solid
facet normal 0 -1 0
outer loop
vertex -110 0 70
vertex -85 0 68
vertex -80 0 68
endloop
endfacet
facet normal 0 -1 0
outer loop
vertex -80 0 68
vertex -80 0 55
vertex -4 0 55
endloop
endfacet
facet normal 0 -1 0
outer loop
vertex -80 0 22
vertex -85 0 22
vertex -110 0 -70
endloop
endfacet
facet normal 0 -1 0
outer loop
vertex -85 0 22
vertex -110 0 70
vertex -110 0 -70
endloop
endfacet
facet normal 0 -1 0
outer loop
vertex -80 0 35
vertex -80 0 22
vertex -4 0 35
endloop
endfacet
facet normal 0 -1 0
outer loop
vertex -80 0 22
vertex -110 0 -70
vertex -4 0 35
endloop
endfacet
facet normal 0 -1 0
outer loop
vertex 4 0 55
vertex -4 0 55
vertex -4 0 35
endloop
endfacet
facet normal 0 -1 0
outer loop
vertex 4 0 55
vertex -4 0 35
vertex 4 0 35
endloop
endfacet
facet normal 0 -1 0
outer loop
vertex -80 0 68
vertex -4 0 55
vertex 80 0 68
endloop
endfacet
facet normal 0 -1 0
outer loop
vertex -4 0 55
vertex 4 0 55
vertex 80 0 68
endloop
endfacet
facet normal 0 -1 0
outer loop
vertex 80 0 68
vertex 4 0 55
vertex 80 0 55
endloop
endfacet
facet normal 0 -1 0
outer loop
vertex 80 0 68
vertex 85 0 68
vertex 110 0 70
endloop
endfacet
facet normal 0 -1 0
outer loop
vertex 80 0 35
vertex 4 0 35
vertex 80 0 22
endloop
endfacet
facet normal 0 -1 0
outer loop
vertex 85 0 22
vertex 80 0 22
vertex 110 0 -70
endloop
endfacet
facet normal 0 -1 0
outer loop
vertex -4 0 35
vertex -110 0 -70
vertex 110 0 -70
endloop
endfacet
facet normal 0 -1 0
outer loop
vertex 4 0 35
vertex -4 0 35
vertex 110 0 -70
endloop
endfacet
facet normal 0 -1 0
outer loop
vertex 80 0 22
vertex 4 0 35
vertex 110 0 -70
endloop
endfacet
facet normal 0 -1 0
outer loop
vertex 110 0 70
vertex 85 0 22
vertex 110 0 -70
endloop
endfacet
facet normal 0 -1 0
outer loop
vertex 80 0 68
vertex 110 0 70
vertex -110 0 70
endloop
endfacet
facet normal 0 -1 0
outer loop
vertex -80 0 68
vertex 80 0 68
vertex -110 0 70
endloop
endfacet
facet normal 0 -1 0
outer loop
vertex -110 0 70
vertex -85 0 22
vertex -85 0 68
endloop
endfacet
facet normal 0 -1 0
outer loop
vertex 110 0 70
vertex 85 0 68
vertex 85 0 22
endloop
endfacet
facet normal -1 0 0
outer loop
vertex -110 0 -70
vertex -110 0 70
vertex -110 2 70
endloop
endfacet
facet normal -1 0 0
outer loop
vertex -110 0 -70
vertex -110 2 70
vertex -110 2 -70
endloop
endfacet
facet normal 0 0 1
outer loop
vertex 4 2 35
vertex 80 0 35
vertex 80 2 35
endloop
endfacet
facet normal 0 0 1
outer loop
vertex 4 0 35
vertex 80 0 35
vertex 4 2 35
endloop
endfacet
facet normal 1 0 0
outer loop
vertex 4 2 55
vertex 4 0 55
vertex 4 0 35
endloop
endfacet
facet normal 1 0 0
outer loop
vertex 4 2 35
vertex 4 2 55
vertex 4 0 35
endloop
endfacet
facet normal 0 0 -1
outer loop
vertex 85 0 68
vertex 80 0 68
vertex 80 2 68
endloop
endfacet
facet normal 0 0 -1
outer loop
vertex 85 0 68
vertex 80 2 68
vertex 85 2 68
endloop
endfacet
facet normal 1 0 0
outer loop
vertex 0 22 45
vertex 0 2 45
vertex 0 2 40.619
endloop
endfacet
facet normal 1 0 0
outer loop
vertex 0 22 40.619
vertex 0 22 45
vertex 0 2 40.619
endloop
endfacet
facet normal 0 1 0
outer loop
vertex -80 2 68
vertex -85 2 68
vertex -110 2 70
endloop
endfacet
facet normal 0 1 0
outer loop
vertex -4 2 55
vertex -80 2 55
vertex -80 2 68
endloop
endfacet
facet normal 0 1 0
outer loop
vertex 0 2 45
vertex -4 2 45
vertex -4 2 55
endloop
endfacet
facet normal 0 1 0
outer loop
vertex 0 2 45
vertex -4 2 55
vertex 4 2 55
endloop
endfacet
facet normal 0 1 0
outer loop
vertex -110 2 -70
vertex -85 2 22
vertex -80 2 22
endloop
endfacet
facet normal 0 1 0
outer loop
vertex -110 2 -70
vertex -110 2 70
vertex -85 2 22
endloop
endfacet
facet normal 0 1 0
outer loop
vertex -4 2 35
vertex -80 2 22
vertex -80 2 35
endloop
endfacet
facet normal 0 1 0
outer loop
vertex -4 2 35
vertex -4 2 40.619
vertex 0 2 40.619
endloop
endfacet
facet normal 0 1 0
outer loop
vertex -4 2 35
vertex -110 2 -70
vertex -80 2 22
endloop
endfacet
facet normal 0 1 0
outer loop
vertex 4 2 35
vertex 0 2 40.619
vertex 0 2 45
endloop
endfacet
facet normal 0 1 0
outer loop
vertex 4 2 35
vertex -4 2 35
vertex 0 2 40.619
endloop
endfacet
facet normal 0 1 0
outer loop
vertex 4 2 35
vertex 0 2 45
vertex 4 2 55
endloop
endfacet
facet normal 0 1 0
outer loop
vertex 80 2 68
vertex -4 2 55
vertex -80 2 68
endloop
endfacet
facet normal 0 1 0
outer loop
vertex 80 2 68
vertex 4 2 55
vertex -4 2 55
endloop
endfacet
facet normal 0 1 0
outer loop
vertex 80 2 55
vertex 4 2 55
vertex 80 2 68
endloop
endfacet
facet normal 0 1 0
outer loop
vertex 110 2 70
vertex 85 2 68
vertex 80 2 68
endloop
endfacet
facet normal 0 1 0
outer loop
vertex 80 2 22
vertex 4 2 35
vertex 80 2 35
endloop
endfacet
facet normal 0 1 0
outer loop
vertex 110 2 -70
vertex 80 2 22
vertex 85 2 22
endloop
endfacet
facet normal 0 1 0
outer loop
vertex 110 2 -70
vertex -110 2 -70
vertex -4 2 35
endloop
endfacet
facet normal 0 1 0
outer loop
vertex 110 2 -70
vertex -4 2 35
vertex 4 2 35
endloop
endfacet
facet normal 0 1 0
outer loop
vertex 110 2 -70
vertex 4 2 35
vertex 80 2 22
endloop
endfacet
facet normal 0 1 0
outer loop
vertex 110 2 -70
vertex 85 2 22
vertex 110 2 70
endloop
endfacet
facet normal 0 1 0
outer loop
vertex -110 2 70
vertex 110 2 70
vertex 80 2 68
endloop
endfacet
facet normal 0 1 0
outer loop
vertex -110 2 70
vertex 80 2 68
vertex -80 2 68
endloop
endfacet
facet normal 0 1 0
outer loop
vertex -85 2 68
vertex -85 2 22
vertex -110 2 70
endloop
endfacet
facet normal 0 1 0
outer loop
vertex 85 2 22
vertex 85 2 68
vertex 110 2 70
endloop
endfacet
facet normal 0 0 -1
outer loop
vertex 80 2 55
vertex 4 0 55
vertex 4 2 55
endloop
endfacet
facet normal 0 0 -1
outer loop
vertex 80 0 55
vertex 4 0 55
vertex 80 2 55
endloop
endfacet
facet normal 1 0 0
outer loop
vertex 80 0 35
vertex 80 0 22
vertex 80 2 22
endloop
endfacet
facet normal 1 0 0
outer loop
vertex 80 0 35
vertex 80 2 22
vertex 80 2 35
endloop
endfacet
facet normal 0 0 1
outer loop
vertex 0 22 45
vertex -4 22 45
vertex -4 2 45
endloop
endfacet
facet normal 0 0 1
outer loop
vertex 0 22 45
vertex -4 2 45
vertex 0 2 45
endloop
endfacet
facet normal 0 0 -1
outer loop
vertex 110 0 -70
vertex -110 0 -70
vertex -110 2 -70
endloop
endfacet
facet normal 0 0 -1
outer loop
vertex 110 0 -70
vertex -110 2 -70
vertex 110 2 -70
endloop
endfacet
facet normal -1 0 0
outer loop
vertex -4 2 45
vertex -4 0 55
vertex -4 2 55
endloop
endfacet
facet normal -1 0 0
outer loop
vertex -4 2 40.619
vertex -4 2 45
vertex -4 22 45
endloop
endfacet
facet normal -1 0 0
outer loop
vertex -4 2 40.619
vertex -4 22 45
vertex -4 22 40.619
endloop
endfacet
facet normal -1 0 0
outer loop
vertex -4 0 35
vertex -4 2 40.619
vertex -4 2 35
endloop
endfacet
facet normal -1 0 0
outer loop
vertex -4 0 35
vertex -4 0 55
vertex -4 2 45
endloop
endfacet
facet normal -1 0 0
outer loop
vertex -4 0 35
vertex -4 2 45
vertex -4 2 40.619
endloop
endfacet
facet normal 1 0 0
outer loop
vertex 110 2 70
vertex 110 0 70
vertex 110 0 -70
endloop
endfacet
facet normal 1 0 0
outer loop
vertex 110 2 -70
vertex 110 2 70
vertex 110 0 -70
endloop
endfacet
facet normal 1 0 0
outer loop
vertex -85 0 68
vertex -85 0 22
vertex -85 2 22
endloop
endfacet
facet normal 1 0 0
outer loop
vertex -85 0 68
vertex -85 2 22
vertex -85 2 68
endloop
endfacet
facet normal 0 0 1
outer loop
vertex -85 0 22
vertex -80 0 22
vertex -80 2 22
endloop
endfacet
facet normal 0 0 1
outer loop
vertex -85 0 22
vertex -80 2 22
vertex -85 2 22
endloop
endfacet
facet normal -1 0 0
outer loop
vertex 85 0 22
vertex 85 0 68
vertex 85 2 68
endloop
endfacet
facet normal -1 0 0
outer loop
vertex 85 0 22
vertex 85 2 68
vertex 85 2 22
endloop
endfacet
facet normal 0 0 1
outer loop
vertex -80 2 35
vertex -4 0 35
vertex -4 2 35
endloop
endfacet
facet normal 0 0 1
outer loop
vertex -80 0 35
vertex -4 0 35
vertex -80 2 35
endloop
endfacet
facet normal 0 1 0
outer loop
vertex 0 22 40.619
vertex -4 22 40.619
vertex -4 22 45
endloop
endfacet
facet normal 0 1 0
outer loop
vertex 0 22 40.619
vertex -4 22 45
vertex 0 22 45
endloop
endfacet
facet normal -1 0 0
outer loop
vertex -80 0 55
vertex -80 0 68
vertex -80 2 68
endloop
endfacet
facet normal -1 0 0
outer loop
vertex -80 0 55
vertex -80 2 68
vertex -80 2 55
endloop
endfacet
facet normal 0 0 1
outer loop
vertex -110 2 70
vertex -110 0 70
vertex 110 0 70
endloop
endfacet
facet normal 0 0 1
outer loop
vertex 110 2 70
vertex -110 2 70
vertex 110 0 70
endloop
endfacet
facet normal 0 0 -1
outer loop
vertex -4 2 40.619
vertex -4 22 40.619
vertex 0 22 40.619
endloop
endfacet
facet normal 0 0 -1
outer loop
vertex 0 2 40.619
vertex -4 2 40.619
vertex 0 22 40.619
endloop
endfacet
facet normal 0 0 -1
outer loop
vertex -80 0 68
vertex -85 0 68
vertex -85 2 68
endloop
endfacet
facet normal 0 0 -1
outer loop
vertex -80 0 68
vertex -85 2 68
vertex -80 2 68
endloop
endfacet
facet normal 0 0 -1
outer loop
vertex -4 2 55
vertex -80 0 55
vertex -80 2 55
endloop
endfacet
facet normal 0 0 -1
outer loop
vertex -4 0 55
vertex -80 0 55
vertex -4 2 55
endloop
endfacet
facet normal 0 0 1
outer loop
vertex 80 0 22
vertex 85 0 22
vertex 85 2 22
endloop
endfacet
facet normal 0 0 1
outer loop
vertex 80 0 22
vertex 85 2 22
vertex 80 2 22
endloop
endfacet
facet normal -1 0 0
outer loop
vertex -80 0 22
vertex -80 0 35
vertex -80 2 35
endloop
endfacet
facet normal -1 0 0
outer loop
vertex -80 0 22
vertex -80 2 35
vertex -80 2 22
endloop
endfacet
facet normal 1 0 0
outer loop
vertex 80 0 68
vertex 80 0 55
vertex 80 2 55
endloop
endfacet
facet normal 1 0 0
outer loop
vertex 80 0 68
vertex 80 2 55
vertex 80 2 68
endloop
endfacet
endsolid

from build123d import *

# Parameters (mm, degrees)
SKETCH2_W           = 220
SKETCH2_H           = 140
BOSS_EXTRUDE1_DEPTH = 2
CUT_EXTRUDE1_DEPTH  = 2
SKETCH4_W           = 8
SKETCH4_H           = 20
BOSS_EXTRUDE2_DEPTH = 2
SKETCH5_W           = 4
SKETCH5_H           = 4.381248614
BOSS_EXTRUDE3_DEPTH = 20


with BuildPart() as part:
    # Sketch2 → Boss-Extrude1 (new body)
    with BuildSketch(Plane(origin=(0, 0, 0), x_dir=(1, 0, 0), z_dir=(0, 1, 0))):
        Rectangle(SKETCH2_W, SKETCH2_H)
    extrude(amount=BOSS_EXTRUDE1_DEPTH)

    # Sketch3 → Cut-Extrude1 (cut)
    with BuildSketch(Plane(origin=(0, 0, 0), x_dir=(1, 0, 0), z_dir=(0, 1, 0))):
        Polygon((-80, -35), (-80, -22), (-85, -22), (-85, -68), (-80, -68), (-80, -55), (80, -55), (80, -68), (85, -68), (85, -22), (80, -22), (80, -35), align=None)
    extrude(amount=CUT_EXTRUDE1_DEPTH, mode=Mode.SUBTRACT)

    # Sketch4 → Boss-Extrude2 (add)
    with BuildSketch(Plane(origin=(0, 0, 0), x_dir=(1, 0, 0), z_dir=(0, 1, 0))):
        with Locations((0, -45)):
            Rectangle(SKETCH4_W, SKETCH4_H)
    extrude(amount=BOSS_EXTRUDE2_DEPTH)

    # Sketch5 → Boss-Extrude3 (add)
    with BuildSketch(Plane(origin=(0, 2, 0), x_dir=(1, 0, 0), z_dir=(0, 1, 0))):
        with Locations((-2, -42.809375693)):
            Rectangle(SKETCH5_W, SKETCH5_H)
    extrude(amount=BOSS_EXTRUDE3_DEPTH)


solid = part.part
